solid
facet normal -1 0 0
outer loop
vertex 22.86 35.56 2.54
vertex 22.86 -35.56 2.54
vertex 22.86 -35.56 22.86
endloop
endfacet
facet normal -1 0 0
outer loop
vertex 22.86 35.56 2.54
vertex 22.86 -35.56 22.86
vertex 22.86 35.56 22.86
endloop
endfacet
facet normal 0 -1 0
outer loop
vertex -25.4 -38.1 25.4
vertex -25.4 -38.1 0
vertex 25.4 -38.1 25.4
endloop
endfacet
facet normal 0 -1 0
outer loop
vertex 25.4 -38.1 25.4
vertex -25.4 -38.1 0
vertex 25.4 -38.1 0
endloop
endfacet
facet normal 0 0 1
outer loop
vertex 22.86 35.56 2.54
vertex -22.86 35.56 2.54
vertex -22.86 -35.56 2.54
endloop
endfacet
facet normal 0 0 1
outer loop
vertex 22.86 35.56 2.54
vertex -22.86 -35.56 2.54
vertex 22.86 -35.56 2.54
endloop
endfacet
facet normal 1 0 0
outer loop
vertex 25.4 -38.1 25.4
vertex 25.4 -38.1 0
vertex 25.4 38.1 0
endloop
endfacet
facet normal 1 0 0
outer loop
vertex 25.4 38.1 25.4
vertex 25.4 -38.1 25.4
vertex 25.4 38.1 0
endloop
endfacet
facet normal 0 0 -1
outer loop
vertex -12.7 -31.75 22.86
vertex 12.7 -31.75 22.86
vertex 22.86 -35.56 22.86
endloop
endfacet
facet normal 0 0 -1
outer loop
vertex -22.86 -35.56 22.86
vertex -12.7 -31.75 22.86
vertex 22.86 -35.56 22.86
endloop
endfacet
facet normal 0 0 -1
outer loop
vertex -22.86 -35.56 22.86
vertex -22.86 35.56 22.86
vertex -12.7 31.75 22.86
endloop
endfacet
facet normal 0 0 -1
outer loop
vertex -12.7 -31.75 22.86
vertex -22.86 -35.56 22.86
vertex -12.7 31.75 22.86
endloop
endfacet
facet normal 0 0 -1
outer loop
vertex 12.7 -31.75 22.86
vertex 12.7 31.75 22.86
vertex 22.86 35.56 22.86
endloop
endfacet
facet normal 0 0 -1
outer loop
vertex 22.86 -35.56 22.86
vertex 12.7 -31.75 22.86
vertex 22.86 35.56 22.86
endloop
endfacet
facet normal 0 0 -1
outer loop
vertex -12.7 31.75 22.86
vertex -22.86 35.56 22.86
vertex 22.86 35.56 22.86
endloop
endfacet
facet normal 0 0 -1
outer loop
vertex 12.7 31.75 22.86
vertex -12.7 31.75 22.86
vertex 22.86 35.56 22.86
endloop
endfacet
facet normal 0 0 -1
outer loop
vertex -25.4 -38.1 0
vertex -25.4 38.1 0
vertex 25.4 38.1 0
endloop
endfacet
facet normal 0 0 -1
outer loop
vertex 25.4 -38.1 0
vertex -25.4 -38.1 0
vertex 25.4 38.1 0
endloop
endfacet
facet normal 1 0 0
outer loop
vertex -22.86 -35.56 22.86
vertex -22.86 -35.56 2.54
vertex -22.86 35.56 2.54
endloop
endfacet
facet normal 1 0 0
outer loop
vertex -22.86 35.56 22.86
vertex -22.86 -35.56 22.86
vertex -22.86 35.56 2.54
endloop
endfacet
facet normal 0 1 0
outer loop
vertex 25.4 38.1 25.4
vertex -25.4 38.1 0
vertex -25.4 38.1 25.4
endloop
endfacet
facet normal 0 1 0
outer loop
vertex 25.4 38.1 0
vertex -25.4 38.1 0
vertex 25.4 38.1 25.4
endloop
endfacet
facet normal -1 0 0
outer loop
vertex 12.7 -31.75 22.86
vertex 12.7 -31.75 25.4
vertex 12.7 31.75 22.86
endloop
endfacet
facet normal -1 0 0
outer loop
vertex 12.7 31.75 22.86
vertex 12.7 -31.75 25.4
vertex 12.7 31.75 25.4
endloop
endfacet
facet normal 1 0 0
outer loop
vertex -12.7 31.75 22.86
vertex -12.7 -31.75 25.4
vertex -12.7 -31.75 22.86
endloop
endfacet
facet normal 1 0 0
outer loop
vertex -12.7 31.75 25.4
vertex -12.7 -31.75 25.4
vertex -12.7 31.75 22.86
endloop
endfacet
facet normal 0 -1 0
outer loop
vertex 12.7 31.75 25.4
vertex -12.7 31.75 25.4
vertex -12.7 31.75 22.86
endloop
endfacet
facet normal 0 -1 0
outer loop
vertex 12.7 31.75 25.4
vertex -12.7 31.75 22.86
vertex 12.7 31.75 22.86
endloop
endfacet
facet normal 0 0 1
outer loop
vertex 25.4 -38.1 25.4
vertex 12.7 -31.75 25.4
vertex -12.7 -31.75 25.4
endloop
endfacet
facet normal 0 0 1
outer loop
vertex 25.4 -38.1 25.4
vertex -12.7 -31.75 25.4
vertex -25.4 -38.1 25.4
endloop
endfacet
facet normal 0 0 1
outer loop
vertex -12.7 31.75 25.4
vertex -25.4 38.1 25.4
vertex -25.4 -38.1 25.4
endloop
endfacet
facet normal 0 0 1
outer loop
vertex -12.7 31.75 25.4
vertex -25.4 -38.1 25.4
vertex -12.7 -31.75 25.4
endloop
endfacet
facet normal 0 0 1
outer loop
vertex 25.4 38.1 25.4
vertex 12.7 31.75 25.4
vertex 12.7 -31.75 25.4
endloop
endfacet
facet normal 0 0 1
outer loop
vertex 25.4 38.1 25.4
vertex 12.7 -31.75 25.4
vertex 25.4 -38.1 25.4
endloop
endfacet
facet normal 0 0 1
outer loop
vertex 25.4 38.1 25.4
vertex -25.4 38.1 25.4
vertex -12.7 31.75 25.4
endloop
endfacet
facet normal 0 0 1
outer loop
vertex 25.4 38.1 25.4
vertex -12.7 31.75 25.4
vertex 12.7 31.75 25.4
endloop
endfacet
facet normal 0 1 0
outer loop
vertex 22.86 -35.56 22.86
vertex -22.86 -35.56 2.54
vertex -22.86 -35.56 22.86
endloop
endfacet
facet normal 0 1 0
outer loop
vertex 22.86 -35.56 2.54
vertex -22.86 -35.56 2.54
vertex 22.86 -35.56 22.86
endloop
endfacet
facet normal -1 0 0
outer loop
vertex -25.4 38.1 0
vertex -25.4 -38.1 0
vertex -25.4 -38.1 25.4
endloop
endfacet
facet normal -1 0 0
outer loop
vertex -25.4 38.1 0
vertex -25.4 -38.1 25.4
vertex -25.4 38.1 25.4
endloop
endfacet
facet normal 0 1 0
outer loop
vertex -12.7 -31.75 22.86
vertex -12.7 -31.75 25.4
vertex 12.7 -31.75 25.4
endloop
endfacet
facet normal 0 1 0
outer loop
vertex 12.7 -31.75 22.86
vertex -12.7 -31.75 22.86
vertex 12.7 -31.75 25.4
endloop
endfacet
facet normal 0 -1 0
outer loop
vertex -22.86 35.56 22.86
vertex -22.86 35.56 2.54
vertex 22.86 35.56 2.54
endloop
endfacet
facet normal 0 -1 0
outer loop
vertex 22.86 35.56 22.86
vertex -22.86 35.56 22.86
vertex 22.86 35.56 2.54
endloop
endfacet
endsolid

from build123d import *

# Parameters (mm, degrees)
F0_W     = 50.8
F0_H     = 76.2
F1_DEPTH = 25.4
F2_W     = 25.4
F2_H     = 63.5
F3_DEPTH = 12.7
F4_T     = -2.54


with BuildPart() as f1:
    # F0 (on Top) → F1 (new body)
    with BuildSketch(Plane.XY):
        Rectangle(F0_W, F0_H)
    extrude(amount=F1_DEPTH)

    # F2 (on face) → F3 (cut)
    with BuildSketch(Plane.XY.offset(25.4)):
        Rectangle(F2_W, F2_H)
    extrude(amount=-F3_DEPTH, mode=Mode.SUBTRACT)

    # F4
    f4_openings = [f1.faces().sort_by_distance(p)[0] for p in [
        (-12.7, 0, 19.05),
        (0, 0, 12.7),
        (0, 31.75, 19.05),
        (12.7, 0, 19.05),
        (0, -31.75, 19.05),
    ]]
    offset(amount=F4_T, openings=f4_openings)


solid = f1.part
